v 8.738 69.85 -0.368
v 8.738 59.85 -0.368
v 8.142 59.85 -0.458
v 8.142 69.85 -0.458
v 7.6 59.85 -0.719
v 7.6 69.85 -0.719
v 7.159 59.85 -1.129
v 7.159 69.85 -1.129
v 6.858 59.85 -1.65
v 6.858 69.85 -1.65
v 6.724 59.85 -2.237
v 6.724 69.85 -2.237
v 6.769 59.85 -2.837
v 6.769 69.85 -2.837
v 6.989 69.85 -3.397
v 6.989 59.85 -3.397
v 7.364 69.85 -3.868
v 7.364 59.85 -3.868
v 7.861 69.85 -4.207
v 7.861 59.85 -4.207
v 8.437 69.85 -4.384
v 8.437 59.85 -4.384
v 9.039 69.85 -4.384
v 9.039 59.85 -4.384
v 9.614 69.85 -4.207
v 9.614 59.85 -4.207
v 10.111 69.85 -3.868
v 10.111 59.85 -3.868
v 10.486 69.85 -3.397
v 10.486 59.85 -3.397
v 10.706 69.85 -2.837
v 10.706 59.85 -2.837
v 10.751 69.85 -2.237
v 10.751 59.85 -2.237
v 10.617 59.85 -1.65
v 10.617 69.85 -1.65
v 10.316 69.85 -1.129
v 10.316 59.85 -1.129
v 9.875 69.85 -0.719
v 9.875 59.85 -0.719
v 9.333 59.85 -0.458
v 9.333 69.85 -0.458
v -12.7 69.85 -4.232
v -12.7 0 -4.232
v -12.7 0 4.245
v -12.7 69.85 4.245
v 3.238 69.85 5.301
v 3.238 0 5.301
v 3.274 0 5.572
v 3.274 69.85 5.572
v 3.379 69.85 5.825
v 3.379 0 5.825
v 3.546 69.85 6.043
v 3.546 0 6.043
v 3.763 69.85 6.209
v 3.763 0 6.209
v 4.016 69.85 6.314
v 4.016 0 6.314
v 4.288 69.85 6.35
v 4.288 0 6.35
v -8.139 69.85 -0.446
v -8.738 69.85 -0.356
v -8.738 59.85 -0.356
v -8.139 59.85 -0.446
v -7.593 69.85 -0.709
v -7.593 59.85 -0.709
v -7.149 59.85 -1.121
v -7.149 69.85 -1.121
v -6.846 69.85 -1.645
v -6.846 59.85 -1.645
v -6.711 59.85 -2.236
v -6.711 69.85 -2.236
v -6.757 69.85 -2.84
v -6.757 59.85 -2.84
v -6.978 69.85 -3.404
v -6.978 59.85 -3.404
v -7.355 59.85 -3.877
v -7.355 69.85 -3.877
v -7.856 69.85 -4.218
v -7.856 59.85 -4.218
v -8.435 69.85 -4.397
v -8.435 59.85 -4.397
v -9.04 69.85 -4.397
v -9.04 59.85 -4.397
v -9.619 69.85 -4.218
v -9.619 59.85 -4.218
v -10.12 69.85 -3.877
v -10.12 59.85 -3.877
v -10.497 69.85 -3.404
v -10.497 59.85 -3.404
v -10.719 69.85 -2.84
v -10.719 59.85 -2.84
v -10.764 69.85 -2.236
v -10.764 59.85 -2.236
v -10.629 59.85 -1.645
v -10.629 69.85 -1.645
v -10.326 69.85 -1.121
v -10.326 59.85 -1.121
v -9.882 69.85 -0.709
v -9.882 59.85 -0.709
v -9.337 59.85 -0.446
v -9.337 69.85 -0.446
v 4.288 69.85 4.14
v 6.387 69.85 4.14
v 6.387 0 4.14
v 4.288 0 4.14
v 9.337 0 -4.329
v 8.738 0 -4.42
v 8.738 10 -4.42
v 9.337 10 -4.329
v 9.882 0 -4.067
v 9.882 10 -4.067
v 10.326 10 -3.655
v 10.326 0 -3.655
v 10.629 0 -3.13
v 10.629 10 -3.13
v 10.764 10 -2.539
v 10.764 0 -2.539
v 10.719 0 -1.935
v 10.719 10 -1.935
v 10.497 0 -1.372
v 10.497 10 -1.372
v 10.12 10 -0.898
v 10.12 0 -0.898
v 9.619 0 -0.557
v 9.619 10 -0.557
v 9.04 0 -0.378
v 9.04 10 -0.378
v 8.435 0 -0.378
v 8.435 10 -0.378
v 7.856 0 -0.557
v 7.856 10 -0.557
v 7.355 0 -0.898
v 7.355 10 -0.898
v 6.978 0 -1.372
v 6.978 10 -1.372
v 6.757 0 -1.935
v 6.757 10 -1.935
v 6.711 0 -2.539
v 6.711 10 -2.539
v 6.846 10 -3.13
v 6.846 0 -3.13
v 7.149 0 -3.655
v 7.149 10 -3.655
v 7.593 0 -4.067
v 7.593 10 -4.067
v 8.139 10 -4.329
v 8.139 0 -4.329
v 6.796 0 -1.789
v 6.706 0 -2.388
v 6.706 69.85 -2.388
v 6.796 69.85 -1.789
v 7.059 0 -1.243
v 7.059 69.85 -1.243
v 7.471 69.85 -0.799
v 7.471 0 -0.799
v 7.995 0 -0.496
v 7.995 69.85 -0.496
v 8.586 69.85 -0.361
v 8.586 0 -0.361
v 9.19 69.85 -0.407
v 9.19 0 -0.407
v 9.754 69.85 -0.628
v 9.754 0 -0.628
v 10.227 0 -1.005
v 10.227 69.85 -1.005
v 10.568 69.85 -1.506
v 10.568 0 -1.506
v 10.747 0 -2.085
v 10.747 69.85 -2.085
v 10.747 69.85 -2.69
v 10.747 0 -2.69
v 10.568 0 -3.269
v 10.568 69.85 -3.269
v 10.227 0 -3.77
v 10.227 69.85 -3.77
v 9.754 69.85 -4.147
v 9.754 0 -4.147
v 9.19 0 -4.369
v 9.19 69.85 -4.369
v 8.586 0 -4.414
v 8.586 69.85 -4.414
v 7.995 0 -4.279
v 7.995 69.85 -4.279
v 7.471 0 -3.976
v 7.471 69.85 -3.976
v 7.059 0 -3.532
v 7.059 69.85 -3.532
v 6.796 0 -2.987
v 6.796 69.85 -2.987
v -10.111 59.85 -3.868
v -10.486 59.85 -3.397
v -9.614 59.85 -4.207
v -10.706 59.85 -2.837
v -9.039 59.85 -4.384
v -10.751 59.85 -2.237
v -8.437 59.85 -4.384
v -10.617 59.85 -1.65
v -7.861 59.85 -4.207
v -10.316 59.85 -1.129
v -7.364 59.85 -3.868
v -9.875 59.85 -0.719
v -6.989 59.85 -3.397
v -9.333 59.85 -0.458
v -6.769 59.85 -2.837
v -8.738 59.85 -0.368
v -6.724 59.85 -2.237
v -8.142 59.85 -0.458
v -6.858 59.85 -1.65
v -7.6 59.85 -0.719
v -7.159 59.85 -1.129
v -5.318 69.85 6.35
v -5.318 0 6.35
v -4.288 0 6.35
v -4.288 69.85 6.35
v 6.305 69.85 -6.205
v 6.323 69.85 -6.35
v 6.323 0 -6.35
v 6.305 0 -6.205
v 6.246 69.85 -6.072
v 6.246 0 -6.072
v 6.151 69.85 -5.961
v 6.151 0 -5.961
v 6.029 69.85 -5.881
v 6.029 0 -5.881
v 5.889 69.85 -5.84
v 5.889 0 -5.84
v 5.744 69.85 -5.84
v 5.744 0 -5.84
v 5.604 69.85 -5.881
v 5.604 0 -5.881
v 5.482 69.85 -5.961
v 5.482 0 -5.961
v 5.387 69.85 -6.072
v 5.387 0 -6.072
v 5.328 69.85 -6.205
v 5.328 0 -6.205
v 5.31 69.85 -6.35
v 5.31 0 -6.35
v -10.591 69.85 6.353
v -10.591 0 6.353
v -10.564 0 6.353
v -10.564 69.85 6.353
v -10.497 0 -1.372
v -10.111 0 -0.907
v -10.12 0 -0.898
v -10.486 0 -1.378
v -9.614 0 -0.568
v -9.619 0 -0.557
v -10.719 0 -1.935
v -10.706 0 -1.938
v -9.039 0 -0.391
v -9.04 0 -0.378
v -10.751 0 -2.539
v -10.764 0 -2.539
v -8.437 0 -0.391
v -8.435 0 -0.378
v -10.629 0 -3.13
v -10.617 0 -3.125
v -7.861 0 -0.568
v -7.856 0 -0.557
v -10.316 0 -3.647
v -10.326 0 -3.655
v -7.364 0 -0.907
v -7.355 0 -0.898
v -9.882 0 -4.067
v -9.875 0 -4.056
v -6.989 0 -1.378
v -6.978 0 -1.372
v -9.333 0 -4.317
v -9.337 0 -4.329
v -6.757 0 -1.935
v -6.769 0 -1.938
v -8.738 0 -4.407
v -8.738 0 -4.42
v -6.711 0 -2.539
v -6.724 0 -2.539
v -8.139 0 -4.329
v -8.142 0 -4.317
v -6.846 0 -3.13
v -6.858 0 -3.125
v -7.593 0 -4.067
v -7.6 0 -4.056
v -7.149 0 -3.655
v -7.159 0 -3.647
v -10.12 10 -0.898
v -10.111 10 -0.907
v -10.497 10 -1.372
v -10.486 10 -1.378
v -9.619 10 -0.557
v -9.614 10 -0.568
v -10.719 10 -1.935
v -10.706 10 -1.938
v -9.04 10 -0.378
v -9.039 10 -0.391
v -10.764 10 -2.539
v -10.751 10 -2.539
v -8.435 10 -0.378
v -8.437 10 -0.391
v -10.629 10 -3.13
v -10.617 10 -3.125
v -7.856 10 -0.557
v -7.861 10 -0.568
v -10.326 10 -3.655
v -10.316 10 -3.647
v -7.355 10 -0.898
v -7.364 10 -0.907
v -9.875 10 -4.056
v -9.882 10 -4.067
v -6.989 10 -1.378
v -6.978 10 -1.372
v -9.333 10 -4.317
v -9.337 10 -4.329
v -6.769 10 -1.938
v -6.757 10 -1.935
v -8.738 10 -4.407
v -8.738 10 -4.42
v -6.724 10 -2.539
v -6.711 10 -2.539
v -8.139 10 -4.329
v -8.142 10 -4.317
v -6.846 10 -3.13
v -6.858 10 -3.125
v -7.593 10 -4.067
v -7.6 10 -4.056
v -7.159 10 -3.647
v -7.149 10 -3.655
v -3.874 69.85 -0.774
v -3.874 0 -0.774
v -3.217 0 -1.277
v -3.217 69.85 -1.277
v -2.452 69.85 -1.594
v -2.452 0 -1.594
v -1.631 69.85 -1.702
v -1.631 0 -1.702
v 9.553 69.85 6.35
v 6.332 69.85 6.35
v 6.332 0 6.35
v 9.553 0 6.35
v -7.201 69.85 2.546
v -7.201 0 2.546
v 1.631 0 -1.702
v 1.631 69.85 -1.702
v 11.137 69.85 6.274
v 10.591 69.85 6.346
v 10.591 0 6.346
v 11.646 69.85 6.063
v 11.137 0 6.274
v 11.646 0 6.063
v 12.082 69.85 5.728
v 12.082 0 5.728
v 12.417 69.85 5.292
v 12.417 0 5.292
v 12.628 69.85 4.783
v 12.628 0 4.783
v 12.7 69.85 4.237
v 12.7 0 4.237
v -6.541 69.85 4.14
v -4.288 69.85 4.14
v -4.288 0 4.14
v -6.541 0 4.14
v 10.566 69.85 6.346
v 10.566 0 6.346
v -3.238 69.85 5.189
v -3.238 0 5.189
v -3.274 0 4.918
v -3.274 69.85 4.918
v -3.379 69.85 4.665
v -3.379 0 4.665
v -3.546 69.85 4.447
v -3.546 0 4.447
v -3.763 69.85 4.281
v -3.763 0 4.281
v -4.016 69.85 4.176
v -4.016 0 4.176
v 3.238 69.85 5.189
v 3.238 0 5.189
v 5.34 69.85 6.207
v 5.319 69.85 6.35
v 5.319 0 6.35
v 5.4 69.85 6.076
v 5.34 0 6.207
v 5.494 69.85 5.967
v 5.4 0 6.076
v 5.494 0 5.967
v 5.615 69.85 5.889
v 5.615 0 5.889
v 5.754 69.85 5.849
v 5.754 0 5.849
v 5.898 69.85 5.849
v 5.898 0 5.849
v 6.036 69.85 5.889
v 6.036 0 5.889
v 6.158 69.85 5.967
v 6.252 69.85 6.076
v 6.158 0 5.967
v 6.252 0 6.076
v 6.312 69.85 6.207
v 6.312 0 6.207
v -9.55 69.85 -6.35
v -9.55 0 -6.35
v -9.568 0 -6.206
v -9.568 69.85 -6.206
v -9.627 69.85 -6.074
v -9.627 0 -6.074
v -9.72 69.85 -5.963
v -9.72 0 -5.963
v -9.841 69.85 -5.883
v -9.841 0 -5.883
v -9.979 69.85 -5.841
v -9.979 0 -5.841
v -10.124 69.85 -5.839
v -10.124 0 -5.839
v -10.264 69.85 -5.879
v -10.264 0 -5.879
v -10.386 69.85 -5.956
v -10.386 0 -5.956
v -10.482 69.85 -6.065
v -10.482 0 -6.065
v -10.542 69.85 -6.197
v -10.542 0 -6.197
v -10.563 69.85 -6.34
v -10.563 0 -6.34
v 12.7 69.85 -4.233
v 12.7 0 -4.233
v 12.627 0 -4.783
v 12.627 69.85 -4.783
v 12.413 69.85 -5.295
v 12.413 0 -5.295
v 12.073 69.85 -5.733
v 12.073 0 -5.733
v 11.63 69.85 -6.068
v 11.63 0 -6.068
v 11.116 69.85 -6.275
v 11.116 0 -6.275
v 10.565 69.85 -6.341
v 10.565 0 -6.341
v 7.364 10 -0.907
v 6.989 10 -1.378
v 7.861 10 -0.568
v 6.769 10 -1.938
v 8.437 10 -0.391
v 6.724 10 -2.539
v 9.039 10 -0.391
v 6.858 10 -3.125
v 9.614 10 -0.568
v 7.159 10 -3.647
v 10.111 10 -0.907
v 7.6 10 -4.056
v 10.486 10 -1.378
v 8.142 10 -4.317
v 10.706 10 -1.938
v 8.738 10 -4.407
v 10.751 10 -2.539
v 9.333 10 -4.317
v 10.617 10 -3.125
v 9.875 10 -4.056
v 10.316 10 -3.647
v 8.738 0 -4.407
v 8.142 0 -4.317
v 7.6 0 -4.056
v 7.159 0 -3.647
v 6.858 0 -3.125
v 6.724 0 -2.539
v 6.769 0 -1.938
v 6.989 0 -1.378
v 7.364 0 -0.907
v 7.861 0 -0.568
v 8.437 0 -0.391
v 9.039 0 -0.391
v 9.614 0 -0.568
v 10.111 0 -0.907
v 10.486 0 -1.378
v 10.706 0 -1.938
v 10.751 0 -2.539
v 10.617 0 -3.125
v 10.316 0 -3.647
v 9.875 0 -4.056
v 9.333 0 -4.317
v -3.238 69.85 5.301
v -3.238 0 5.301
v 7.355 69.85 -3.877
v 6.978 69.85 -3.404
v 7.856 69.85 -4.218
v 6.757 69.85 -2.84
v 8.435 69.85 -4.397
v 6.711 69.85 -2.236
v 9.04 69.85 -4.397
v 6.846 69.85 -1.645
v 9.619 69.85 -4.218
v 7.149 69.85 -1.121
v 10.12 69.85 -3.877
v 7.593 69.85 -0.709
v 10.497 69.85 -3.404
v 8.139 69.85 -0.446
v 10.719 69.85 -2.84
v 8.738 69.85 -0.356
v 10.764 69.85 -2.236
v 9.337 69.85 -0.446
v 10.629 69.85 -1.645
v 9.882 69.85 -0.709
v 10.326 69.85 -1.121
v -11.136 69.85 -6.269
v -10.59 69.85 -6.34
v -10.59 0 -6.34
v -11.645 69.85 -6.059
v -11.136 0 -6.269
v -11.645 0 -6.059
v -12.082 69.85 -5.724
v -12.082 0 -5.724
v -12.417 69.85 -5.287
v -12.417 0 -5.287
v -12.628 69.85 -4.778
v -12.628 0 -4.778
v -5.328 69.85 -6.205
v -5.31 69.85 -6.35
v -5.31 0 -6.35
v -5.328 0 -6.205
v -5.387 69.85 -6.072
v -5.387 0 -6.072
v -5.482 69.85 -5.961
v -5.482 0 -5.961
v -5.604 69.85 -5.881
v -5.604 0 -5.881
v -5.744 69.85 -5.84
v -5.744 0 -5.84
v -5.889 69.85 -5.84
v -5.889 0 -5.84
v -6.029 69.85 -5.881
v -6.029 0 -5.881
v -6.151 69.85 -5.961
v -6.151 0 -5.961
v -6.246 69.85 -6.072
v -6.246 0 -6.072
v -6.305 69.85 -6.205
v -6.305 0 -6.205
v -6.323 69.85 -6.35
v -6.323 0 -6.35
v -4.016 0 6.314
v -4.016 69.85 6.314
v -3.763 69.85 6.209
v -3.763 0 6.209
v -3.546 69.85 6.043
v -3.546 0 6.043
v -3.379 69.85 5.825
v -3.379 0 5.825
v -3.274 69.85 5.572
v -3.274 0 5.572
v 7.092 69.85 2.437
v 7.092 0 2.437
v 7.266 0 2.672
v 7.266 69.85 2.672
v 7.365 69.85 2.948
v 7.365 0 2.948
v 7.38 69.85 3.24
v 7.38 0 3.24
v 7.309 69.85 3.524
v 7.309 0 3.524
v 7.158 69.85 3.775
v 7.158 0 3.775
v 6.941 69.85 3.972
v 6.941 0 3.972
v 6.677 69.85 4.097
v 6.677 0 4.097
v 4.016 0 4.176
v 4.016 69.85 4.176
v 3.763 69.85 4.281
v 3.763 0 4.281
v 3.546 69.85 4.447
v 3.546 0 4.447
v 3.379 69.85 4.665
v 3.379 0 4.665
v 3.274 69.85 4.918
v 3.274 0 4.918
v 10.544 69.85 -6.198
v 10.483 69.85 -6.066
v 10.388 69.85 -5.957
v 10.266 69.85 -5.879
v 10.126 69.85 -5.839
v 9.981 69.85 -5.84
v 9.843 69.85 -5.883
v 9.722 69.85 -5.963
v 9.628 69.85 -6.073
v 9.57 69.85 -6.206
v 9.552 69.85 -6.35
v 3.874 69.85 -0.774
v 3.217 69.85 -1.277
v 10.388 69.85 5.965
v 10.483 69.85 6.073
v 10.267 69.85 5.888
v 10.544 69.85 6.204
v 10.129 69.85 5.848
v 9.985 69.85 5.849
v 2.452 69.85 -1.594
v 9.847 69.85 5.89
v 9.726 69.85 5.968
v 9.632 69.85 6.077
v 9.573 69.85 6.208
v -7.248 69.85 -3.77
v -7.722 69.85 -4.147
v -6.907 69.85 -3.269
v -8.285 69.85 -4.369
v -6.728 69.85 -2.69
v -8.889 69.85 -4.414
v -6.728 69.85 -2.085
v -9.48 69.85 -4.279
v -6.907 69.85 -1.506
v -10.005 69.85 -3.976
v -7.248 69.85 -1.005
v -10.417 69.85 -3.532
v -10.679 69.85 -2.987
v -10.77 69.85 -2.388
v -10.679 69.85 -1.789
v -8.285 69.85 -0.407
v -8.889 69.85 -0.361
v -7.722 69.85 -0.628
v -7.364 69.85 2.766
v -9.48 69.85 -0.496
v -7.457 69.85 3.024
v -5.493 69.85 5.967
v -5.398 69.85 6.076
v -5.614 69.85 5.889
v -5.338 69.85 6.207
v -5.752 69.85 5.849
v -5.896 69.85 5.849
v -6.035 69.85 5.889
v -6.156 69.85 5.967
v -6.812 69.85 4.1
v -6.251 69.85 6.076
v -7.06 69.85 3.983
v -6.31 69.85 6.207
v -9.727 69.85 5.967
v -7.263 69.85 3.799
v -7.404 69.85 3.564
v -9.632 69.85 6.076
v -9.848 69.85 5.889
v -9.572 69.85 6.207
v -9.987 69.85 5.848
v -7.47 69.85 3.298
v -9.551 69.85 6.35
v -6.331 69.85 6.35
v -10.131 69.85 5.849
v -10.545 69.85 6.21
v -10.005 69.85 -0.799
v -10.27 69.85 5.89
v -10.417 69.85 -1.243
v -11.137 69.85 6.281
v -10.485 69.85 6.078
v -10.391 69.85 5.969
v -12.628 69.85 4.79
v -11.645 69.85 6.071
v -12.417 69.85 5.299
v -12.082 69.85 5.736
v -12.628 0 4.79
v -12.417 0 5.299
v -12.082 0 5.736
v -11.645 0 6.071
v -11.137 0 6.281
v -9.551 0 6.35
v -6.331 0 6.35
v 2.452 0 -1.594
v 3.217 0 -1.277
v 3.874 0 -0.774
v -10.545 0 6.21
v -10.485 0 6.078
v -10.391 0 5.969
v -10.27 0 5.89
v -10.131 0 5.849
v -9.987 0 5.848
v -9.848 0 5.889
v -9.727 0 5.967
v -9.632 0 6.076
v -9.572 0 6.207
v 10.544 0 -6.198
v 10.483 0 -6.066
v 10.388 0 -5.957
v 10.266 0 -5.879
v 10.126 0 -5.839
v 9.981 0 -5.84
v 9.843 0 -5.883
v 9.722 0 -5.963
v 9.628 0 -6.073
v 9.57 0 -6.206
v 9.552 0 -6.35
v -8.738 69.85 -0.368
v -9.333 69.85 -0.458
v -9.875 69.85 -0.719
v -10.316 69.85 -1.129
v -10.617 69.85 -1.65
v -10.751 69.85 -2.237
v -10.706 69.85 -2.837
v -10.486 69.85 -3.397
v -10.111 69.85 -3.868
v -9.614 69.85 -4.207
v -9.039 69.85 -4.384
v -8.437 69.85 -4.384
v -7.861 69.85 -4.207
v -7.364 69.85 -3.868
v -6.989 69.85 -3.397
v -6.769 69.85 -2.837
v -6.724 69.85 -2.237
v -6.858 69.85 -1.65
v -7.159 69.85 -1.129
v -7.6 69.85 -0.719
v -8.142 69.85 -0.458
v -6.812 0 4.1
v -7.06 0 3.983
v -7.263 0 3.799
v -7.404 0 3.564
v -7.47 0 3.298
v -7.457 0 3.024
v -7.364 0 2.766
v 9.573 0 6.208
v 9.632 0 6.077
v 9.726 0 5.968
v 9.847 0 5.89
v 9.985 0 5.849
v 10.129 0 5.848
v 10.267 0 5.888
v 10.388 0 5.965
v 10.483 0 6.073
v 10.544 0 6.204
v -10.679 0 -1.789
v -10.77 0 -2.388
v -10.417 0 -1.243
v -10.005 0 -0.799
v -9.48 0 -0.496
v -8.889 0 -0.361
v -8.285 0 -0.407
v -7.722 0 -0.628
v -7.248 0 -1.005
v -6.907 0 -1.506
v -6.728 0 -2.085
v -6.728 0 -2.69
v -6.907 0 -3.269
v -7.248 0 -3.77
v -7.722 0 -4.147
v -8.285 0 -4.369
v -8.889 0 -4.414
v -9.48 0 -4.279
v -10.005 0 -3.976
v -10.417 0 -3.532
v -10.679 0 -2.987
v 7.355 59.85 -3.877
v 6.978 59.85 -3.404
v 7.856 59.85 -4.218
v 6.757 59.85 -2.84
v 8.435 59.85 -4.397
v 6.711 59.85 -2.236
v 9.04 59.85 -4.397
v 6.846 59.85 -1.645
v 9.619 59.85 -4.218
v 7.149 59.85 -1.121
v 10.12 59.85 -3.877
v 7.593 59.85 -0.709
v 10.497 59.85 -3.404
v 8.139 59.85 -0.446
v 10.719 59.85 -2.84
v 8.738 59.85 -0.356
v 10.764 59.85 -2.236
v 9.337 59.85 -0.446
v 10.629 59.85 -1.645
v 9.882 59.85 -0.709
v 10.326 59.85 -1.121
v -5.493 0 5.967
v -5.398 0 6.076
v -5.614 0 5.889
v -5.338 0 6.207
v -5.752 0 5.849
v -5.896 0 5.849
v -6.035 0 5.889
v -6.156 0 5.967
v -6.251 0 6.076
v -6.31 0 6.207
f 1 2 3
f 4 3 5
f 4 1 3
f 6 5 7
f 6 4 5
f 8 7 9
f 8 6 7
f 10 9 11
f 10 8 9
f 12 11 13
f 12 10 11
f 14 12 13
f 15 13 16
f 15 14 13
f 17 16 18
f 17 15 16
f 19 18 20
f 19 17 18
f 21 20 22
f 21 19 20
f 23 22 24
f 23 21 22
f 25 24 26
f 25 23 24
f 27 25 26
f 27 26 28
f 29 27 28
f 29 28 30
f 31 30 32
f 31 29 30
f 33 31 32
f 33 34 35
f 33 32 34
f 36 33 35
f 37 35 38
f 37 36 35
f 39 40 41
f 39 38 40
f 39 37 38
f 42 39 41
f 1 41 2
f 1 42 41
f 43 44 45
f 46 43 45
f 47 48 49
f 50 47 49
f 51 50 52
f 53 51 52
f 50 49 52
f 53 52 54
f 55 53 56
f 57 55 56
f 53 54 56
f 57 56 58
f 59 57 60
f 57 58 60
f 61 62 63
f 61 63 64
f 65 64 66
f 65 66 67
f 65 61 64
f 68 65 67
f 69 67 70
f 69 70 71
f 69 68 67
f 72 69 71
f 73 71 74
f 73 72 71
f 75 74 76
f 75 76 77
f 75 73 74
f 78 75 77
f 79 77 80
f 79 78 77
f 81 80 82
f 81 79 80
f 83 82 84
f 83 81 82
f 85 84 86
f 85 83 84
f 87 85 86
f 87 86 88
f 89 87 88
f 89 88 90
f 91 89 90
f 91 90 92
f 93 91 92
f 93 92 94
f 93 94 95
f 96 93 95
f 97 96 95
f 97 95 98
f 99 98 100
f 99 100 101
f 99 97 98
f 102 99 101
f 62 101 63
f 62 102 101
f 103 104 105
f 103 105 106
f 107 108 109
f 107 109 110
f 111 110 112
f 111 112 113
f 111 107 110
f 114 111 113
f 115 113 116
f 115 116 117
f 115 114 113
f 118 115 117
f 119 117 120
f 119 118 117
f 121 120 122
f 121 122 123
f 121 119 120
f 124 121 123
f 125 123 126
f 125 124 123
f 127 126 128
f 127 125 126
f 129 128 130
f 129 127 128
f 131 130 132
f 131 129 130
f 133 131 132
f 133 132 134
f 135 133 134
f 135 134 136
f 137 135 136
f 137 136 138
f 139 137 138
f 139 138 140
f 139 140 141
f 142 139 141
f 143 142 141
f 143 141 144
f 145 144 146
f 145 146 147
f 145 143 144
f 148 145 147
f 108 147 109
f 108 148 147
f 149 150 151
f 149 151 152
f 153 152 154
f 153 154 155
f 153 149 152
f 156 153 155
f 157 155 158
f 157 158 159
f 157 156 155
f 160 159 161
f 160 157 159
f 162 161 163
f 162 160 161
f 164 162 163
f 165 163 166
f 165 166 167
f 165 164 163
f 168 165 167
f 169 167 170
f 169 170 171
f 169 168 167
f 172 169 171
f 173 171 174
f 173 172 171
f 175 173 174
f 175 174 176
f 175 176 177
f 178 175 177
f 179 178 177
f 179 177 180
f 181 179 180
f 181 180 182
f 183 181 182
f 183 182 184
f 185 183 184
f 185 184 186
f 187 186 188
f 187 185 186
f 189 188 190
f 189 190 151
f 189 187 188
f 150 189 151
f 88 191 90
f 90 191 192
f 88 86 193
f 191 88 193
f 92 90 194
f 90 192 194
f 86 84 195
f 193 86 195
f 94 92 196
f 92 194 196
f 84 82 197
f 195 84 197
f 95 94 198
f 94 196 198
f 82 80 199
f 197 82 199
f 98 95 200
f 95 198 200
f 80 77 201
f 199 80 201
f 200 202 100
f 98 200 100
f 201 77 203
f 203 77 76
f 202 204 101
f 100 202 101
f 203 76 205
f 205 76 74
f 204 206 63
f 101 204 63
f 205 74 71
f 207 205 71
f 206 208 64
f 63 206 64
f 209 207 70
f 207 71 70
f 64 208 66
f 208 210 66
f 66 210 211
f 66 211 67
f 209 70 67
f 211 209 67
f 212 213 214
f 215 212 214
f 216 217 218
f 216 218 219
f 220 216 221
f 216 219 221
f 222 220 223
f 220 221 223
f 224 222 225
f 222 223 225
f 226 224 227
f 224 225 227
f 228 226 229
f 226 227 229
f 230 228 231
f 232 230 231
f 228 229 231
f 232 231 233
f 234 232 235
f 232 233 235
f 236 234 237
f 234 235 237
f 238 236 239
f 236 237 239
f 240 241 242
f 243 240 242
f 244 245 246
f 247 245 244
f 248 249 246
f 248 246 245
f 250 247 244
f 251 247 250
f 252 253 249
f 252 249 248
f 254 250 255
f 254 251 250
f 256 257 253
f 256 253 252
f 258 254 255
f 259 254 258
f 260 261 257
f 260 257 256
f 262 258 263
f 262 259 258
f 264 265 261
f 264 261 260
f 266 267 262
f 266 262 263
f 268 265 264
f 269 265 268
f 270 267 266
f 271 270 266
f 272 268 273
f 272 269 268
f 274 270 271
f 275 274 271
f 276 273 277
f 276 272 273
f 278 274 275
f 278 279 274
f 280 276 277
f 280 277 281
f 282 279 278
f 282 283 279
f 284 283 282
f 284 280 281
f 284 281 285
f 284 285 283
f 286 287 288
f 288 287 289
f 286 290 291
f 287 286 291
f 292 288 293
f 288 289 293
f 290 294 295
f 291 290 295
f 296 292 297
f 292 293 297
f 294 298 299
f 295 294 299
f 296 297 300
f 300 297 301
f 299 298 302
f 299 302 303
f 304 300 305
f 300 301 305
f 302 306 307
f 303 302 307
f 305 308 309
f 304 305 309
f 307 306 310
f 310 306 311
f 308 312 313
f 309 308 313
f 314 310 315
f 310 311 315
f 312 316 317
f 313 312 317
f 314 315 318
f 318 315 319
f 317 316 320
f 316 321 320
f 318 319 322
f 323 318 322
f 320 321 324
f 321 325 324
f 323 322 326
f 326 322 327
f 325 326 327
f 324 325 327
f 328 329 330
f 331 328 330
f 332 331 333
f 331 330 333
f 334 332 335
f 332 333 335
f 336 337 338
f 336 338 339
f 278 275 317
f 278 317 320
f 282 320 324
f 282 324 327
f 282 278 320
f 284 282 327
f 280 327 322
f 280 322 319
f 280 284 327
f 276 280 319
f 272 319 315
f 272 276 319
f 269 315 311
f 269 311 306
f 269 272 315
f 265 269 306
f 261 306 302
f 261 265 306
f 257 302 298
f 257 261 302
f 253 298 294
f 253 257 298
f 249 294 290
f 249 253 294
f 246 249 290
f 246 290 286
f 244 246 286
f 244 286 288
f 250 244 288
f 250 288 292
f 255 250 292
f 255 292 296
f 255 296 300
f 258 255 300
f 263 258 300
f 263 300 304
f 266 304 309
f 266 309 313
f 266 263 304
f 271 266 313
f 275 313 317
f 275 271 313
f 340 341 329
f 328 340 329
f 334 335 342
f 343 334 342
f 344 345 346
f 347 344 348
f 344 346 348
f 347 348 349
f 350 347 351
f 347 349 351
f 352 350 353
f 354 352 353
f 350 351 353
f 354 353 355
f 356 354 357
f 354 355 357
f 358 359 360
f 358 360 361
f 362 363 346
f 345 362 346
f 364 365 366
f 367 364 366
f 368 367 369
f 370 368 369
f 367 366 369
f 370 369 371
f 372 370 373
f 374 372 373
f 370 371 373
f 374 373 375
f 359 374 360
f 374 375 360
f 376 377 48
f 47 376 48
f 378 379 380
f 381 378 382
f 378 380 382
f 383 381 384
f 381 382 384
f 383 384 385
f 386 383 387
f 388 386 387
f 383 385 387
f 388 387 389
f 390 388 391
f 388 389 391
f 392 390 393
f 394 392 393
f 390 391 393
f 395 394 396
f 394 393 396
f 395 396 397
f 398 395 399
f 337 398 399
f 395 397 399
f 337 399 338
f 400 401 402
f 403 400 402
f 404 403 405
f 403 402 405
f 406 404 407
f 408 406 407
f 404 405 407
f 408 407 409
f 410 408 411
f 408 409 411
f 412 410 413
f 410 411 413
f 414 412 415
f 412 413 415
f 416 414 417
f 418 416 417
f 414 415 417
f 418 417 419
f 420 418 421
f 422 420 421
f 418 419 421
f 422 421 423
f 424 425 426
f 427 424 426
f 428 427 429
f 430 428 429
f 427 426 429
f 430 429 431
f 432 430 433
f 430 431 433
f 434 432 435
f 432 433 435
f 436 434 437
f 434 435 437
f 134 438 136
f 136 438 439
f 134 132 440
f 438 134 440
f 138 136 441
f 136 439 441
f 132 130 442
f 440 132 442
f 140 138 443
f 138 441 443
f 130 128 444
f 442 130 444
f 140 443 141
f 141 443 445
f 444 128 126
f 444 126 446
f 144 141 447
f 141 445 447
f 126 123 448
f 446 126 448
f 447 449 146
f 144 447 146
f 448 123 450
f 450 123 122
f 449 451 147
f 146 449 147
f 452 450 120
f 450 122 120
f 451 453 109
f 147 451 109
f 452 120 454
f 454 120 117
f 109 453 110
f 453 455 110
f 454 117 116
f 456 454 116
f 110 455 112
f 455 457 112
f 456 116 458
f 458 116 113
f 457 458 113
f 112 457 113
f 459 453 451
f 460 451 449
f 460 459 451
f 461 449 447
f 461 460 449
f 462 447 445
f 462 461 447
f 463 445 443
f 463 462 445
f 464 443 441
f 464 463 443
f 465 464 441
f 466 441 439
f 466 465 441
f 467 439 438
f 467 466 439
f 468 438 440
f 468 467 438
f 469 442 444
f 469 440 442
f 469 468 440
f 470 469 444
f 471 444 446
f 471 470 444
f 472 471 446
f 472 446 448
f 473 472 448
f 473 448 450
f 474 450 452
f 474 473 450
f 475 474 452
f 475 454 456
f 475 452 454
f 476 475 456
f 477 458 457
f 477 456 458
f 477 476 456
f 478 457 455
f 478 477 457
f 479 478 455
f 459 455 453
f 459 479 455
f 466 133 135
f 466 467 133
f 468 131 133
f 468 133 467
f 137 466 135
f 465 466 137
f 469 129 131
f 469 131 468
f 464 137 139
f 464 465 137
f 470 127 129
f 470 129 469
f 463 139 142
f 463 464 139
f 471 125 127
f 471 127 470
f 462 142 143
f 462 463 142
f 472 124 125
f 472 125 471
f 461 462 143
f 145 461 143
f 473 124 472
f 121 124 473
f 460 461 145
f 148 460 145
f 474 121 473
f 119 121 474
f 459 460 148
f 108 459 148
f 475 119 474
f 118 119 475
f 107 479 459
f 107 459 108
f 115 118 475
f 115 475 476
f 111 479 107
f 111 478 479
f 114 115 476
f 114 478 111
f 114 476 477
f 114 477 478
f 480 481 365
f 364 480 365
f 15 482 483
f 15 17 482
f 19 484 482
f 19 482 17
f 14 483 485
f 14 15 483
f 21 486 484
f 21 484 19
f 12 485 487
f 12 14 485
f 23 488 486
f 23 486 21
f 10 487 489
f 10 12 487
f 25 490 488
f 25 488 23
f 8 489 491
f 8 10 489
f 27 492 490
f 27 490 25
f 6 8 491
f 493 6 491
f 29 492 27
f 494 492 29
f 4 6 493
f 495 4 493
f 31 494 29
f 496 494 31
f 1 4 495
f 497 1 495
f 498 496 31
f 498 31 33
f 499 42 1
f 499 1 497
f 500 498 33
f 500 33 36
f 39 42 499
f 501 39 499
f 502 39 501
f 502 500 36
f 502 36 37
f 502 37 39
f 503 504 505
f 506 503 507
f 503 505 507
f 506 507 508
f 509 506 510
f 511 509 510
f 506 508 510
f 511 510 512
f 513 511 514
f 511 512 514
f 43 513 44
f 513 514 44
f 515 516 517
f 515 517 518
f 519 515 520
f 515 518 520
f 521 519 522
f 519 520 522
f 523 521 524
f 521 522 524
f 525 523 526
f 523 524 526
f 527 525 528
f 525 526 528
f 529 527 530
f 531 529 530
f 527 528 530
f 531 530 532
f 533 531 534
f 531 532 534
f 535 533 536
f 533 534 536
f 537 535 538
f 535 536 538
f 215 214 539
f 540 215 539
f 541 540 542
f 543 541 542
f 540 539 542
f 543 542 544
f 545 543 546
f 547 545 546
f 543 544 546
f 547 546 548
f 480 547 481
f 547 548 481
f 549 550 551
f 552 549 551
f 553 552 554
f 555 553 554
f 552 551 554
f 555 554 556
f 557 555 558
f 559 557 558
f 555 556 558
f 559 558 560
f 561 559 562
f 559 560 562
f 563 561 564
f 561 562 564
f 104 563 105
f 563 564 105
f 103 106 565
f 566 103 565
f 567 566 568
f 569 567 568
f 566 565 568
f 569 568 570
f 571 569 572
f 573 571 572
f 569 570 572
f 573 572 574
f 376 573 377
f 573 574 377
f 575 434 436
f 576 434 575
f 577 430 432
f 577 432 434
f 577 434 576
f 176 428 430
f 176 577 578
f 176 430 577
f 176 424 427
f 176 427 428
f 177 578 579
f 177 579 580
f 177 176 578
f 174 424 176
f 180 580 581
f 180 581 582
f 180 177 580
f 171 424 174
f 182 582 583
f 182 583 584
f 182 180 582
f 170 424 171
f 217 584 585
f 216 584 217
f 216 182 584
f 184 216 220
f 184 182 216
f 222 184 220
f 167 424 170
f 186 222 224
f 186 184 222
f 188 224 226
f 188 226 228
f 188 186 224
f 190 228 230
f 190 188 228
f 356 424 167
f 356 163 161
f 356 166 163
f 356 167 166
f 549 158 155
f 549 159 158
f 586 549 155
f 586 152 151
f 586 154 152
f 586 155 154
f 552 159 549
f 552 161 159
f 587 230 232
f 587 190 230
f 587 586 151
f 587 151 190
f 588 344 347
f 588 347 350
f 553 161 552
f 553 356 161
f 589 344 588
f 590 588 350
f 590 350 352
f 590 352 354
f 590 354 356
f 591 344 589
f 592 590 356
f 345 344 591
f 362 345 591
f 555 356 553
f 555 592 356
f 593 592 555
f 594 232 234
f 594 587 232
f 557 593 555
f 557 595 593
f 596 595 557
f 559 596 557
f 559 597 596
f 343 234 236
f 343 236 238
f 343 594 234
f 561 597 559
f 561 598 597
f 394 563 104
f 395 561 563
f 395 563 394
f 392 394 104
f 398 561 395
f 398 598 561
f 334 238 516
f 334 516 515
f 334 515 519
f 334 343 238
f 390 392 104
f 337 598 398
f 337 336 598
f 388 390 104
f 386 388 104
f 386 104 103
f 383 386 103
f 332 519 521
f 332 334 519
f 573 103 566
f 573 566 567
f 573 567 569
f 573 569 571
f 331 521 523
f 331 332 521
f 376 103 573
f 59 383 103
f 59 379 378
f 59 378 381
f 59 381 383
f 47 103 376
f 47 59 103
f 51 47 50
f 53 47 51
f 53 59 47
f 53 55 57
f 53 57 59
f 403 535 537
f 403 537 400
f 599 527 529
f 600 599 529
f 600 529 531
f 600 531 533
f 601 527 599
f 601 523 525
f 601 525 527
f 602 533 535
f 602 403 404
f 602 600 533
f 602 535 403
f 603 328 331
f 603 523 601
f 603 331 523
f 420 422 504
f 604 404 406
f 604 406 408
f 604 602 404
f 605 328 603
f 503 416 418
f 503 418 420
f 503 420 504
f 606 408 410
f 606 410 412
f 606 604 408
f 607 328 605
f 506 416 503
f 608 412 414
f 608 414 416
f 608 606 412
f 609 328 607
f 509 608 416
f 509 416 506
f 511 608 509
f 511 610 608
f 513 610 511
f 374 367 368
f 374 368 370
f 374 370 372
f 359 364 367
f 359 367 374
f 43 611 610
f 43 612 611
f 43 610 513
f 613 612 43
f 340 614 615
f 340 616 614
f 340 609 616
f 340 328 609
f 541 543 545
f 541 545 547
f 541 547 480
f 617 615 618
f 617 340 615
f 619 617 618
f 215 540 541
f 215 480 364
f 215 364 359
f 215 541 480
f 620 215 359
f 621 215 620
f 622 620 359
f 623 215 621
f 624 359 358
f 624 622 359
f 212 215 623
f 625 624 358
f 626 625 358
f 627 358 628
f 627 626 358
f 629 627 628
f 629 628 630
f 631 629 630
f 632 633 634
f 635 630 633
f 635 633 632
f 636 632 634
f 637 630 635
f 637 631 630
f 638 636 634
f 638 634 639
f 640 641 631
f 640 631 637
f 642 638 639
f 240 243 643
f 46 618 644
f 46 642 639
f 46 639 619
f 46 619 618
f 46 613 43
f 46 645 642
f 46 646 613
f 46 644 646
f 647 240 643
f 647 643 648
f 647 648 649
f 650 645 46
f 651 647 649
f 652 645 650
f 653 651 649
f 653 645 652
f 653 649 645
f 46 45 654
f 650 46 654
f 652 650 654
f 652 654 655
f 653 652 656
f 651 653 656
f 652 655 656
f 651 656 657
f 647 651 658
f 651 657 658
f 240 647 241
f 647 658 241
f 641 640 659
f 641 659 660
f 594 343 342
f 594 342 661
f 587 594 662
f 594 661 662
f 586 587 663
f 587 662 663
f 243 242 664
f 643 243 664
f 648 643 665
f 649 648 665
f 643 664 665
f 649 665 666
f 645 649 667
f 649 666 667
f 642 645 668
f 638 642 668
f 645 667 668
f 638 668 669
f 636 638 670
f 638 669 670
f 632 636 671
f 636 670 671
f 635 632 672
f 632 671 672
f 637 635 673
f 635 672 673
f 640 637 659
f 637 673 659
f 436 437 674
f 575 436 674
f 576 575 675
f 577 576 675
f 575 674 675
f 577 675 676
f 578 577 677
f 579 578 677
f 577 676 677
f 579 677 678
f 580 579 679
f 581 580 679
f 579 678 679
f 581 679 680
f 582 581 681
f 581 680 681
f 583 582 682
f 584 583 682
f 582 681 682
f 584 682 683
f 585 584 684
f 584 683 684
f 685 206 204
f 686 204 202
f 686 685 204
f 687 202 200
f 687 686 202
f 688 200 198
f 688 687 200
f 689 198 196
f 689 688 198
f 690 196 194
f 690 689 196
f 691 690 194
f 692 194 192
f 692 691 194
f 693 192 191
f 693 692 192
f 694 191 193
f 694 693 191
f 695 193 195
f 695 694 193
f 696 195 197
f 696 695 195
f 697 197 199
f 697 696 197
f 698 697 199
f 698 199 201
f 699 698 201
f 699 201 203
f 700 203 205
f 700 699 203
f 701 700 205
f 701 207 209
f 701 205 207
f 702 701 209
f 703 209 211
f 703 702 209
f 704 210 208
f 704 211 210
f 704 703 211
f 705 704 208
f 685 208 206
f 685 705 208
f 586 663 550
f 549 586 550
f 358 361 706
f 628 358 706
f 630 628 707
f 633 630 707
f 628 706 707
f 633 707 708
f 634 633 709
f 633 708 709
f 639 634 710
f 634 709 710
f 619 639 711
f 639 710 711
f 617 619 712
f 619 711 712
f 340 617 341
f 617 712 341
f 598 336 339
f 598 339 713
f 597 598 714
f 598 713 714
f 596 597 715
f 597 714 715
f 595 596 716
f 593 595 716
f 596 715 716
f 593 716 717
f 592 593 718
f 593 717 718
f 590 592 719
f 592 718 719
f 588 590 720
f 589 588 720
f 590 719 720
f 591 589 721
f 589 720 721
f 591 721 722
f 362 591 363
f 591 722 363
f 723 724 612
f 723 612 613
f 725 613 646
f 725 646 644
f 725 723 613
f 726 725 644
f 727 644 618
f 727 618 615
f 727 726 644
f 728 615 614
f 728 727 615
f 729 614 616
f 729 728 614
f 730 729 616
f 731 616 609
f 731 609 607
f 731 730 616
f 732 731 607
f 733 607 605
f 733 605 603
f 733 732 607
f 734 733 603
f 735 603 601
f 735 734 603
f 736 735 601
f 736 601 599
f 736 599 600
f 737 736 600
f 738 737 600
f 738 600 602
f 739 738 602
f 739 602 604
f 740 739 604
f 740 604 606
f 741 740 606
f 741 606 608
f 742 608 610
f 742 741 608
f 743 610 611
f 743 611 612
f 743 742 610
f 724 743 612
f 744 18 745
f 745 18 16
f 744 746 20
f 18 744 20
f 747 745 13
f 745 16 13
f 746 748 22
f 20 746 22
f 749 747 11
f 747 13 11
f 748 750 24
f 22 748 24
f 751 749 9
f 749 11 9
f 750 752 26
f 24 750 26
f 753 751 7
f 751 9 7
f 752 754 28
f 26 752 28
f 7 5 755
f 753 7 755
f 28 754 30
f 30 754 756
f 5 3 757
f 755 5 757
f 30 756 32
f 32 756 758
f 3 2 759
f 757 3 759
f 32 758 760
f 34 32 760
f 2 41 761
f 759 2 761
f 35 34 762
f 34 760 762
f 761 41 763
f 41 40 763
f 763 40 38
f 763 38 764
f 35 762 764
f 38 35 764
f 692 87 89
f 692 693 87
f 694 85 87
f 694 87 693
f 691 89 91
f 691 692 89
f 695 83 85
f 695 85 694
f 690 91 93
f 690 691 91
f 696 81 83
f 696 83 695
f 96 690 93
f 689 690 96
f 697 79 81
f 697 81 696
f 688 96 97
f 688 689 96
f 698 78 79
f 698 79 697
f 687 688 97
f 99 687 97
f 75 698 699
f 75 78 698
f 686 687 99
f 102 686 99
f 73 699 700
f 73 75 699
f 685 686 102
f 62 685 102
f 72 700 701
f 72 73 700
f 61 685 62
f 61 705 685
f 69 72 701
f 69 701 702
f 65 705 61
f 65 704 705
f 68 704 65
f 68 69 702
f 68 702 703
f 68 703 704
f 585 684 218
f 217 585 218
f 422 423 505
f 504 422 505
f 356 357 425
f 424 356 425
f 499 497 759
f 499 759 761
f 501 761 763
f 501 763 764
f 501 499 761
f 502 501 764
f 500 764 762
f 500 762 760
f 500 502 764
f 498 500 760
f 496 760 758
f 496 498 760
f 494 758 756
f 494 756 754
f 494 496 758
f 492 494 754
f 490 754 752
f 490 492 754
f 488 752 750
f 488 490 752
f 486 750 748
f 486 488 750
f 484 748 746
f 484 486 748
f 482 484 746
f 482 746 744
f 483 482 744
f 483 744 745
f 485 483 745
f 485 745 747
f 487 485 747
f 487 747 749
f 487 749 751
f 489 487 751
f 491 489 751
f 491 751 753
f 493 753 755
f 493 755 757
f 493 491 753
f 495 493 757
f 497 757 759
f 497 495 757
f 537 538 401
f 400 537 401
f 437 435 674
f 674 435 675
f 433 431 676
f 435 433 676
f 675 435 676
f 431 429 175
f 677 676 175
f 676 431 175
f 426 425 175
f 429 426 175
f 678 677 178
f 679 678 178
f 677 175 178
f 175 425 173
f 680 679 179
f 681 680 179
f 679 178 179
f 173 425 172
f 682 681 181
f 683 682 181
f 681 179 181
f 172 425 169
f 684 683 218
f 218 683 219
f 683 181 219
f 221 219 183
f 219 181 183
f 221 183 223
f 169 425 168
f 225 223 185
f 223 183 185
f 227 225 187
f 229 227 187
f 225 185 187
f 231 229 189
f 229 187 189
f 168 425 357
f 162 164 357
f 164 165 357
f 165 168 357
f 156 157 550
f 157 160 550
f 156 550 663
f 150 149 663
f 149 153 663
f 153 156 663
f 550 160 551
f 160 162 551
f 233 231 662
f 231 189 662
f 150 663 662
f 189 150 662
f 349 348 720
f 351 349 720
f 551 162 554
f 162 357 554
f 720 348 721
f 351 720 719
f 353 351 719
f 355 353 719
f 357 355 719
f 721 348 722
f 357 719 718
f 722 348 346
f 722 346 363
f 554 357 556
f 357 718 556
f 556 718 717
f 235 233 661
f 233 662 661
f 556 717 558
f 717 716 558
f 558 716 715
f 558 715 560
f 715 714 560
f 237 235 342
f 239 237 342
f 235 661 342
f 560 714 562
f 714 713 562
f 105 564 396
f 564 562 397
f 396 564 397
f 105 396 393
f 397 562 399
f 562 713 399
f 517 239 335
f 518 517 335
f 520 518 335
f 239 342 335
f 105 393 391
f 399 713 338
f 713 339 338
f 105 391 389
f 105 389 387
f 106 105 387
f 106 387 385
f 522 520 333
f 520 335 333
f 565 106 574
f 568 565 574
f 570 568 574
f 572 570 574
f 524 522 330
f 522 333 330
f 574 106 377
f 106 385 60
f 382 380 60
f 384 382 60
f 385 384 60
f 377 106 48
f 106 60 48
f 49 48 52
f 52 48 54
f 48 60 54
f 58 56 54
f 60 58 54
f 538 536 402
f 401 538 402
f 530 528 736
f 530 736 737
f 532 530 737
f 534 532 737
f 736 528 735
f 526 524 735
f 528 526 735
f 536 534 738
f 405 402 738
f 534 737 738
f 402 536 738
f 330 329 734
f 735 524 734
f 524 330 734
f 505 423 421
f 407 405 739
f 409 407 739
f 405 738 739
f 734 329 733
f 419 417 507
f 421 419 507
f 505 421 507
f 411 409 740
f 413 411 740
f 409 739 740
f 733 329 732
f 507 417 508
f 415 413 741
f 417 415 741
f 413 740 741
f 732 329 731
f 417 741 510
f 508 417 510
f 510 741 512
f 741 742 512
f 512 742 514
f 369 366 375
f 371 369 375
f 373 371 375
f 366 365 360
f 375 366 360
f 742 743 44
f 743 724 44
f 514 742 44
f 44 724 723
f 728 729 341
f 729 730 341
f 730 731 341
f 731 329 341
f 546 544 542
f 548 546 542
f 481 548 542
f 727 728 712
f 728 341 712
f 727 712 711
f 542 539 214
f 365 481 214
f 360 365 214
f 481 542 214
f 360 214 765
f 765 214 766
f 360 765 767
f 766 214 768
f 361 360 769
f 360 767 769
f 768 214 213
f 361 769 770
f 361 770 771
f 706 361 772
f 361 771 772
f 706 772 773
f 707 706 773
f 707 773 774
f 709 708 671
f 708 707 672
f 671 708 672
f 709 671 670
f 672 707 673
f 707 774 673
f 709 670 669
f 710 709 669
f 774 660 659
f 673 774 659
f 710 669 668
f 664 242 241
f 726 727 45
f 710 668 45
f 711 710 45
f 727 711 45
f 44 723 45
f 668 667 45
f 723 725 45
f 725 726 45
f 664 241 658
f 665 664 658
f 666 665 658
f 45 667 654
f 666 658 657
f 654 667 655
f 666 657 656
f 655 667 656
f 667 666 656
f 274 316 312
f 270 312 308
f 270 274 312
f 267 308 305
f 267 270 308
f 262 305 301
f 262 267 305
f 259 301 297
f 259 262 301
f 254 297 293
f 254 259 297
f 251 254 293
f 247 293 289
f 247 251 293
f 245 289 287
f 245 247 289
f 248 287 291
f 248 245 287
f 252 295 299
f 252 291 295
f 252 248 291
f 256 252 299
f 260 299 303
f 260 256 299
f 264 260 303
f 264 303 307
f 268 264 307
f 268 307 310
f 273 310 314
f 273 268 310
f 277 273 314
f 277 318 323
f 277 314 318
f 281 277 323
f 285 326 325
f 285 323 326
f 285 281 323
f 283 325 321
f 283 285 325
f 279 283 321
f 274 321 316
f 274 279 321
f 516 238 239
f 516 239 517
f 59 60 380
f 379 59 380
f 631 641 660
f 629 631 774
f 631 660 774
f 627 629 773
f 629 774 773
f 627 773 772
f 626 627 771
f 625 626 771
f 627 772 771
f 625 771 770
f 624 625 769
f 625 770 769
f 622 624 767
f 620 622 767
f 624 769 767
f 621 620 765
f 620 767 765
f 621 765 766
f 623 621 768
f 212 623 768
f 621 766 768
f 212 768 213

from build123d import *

# Parameters (mm, degrees)
SKETCH11_R                      = 2.032
F_10_1050_PROFILE_1_DEPTH       = 69.85
SKETCH14_R                      = 2.032
SKETCH14_R_2                    = 1.5
BOSS_EXTRUDE1_DEPTH             = 10
BOSS_EXTRUDE1_2_DEPTH           = 10
F_10_32_TAPPED_HOLE3_AT_2_COUNT = 2
F_10_32_TAPPED_HOLE3_AT_2_PITCH = 17.4752
SKETCH17_R                      = 2.032
SKETCH17_R_2                    = 1.25
BOSS_EXTRUDE2_DEPTH             = 10
BOSS_EXTRUDE2_2_DEPTH           = 10
F_10_32_TAPPED_HOLE4_AT_2_COUNT = 2
F_10_32_TAPPED_HOLE4_AT_2_PITCH = 17.4752


with BuildPart() as part:
    # Sketch11 → 10 1050 PROFILE(1) (new body)
    with BuildSketch(Plane(origin=(0, 0, 0), x_dir=(-1, 0, 0), z_dir=(0, 1, 0))):
        with BuildLine():
            Line((9.551093887, 6.35), (6.330982008, 6.35))
            ThreePointArc((6.330982008, 6.35), (5.824379679, 5.843397671), (5.31777735, 6.35))
            Line((5.31777735, 6.35), (4.28752, 6.35))
            ThreePointArc((4.28752, 6.35), (3.545750844, 6.042749156), (3.2385, 5.30098))
            Line((3.2385, 5.30098), (3.2385, 5.18922))
            ThreePointArc((3.2385, 5.18922), (3.545750844, 4.447450844), (4.28752, 4.1402))
            Line((4.28752, 4.1402), (6.541264932, 4.1402))
            ThreePointArc((6.541264932, 4.1402), (7.403778411, 3.563601238), (7.200674335, 2.54618079))
            Line((7.200674335, 2.54618079), (3.874487735, -0.773919123))
            ThreePointArc((3.874487735, -0.773919123), (2.845157282, -1.460673567), (1.631480681, -1.7018))
            Line((1.631480681, -1.7018), (-1.631480681, -1.7018))
            ThreePointArc((-1.631480681, -1.7018), (-2.845157282, -1.460673567), (-3.874487735, -0.773919123))
            Line((-3.874487735, -0.773919123), (-7.091634343, 2.437340333))
            ThreePointArc((-7.091634343, 2.437340333), (-7.30860647, 3.524230776), (-6.387200124, 4.1402))
            Line((-6.387200124, 4.1402), (-4.28752, 4.1402))
            ThreePointArc((-4.28752, 4.1402), (-3.545750844, 4.447450844), (-3.2385, 5.18922))
            Line((-3.2385, 5.18922), (-3.2385, 5.30098))
            ThreePointArc((-3.2385, 5.30098), (-3.545750844, 6.042749156), (-4.28752, 6.35))
            Line((-4.28752, 6.35), (-5.319235427, 6.35))
            ThreePointArc((-5.319235427, 6.35), (-5.825837756, 5.843397671), (-6.332440085, 6.35))
            Line((-6.332440085, 6.35), (-9.552501021, 6.35))
            ThreePointArc((-9.552501021, 6.35), (-10.056951984, 5.843402239), (-10.565687406, 6.345697309))
            Line((-10.565687406, 6.345697309), (-10.591304516, 6.345701455))
            ThreePointArc((-10.591304516, 6.345701455), (-12.082359481, 5.728298321), (-12.7, 4.237343309))
            Line((-12.7, 4.237343309), (-12.7, -4.233074923))
            ThreePointArc((-12.7, -4.233074923), (-12.072915167, -5.733409532), (-10.564685825, -6.341261141))
            ThreePointArc((-10.564685825, -6.341261141), (-10.053713904, -5.834598435), (-9.551557924, -6.35))
            Line((-9.551557924, -6.35), (-6.323021107, -6.35))
            ThreePointArc((-6.323021107, -6.35), (-5.816495529, -5.83457959), (-5.309969951, -6.35))
            Line((-5.309969951, -6.35), (5.309969951, -6.35))
            ThreePointArc((5.309969951, -6.35), (5.816495529, -5.83457959), (6.323021107, -6.35))
            Line((6.323021107, -6.35), (9.550160942, -6.35))
            ThreePointArc((9.550160942, -6.35), (10.051855758, -5.834602622), (10.563288148, -6.340338775))
            Line((10.563288148, -6.340338775), (10.589922543, -6.34049468))
            ThreePointArc((10.589922543, -6.34049468), (12.081868228, -5.723579066), (12.7, -4.23213684))
            Line((12.7, -4.23213684), (12.7, 4.244714967))
            ThreePointArc((12.7, 4.244714967), (12.082266163, 5.735759476), (10.591047766, 6.353073372))
            Line((10.591047766, 6.353073372), (10.564289268, 6.353065837))
            ThreePointArc((10.564289268, 6.353065837), (10.059229141, 5.84339999), (9.551093887, 6.35))
        make_face()
        with Locations((-8.7376, -2.3876)):
            Circle(SKETCH11_R, mode=Mode.SUBTRACT)
        with Locations((8.7376, -2.3876)):
            Circle(SKETCH11_R, mode=Mode.SUBTRACT)
    extrude(amount=F_10_1050_PROFILE_1_DEPTH)


with BuildPart() as body_2:
    # Sketch14 → Boss-Extrude1 (new body)
    with BuildSketch(Plane(origin=(0, 69.85, 0), x_dir=(1, 0, 0), z_dir=(0, 1, 0))):
        with Locations(Location((8.7376, 2.3876, 0), (0, 0, 270))):
            Circle(SKETCH14_R)
        with Locations(Location((8.7376, 2.3876, 0), (0, 0, 270))):
            Circle(SKETCH14_R_2, mode=Mode.SUBTRACT)
    extrude(amount=-BOSS_EXTRUDE1_DEPTH)


with BuildPart() as body_3:
    # Sketch14 → Boss-Extrude1 2 (new body)
    with BuildSketch(Plane(origin=(0, 69.85, 0), x_dir=(1, 0, 0), z_dir=(0, 1, 0))):
        with Locations(Location((-8.7376, 2.3876, 0), (0, 0, 270))):
            Circle(SKETCH14_R)
        with Locations(Location((-8.7376, 2.3876, 0), (0, 0, 270))):
            Circle(SKETCH14_R_2, mode=Mode.SUBTRACT)
    extrude(amount=-BOSS_EXTRUDE1_2_DEPTH)

    # Sketch16 → #10-32 Tapped Hole3 (revolve, cut)
    with BuildSketch(Plane(origin=(-8.7376, 69.85, -2.3876), x_dir=(0, 0, 1), z_dir=(1, 0, 0))):
        Polygon((0, 0), (0, 13.243317848), (2.0193, 12.03), (2.0193, 0), align=None)
    f_10_32_tapped_hole3 = revolve(axis=Axis((-8.7376, 76.2, -2.3876), (0, -1, 0)), mode=Mode.SUBTRACT)


with BuildPart() as body_2_1:
    add(body_2.part)

    # #10-32 Tapped Hole3 at 2: #10-32 Tapped Hole3 ×2
    with Locations(*[(i * F_10_32_TAPPED_HOLE3_AT_2_PITCH, 0, 0) for i in range(1, F_10_32_TAPPED_HOLE3_AT_2_COUNT)]):
        add(f_10_32_tapped_hole3, mode=Mode.SUBTRACT)


with BuildPart() as body_4:
    # Sketch17 → Boss-Extrude2 (new body)
    with BuildSketch(Plane.XZ):
        with Locations(Location((-8.7376, -2.3876, 0), (0, 0, 270))):
            Circle(SKETCH17_R)
        with Locations(Location((-8.7376, -2.3876, 0), (0, 0, 270))):
            Circle(SKETCH17_R_2, mode=Mode.SUBTRACT)
    extrude(amount=-BOSS_EXTRUDE2_DEPTH)

    # Sketch19 → #10-32 Tapped Hole4 (revolve, cut)
    with BuildSketch(Plane(origin=(-8.7376, 0, -2.3876), x_dir=(0, 0, -1), z_dir=(1, 0, 0))):
        Polygon((0, 0), (0, 13.243317848), (2.0193, 12.03), (2.0193, 0), align=None)
    f_10_32_tapped_hole4 = revolve(axis=Axis((-8.7376, -6.35, -2.3876), (0, 1, 0)), mode=Mode.SUBTRACT)


with BuildPart() as body_5:
    # Sketch17 → Boss-Extrude2 2 (new body)
    with BuildSketch(Plane.XZ):
        with Locations(Location((8.7376, -2.3876, 0), (0, 0, 270))):
            Circle(SKETCH17_R)
        with Locations(Location((8.7376, -2.3876, 0), (0, 0, 270))):
            Circle(SKETCH17_R_2, mode=Mode.SUBTRACT)
    extrude(amount=-BOSS_EXTRUDE2_2_DEPTH)

    # #10-32 Tapped Hole4 at 2: #10-32 Tapped Hole4 ×2
    with Locations(*[(i * F_10_32_TAPPED_HOLE4_AT_2_PITCH, 0, 0) for i in range(1, F_10_32_TAPPED_HOLE4_AT_2_COUNT)]):
        add(f_10_32_tapped_hole4, mode=Mode.SUBTRACT)


solid = Compound([part.part, body_3.part, body_2_1.part, body_4.part, body_5.part])
